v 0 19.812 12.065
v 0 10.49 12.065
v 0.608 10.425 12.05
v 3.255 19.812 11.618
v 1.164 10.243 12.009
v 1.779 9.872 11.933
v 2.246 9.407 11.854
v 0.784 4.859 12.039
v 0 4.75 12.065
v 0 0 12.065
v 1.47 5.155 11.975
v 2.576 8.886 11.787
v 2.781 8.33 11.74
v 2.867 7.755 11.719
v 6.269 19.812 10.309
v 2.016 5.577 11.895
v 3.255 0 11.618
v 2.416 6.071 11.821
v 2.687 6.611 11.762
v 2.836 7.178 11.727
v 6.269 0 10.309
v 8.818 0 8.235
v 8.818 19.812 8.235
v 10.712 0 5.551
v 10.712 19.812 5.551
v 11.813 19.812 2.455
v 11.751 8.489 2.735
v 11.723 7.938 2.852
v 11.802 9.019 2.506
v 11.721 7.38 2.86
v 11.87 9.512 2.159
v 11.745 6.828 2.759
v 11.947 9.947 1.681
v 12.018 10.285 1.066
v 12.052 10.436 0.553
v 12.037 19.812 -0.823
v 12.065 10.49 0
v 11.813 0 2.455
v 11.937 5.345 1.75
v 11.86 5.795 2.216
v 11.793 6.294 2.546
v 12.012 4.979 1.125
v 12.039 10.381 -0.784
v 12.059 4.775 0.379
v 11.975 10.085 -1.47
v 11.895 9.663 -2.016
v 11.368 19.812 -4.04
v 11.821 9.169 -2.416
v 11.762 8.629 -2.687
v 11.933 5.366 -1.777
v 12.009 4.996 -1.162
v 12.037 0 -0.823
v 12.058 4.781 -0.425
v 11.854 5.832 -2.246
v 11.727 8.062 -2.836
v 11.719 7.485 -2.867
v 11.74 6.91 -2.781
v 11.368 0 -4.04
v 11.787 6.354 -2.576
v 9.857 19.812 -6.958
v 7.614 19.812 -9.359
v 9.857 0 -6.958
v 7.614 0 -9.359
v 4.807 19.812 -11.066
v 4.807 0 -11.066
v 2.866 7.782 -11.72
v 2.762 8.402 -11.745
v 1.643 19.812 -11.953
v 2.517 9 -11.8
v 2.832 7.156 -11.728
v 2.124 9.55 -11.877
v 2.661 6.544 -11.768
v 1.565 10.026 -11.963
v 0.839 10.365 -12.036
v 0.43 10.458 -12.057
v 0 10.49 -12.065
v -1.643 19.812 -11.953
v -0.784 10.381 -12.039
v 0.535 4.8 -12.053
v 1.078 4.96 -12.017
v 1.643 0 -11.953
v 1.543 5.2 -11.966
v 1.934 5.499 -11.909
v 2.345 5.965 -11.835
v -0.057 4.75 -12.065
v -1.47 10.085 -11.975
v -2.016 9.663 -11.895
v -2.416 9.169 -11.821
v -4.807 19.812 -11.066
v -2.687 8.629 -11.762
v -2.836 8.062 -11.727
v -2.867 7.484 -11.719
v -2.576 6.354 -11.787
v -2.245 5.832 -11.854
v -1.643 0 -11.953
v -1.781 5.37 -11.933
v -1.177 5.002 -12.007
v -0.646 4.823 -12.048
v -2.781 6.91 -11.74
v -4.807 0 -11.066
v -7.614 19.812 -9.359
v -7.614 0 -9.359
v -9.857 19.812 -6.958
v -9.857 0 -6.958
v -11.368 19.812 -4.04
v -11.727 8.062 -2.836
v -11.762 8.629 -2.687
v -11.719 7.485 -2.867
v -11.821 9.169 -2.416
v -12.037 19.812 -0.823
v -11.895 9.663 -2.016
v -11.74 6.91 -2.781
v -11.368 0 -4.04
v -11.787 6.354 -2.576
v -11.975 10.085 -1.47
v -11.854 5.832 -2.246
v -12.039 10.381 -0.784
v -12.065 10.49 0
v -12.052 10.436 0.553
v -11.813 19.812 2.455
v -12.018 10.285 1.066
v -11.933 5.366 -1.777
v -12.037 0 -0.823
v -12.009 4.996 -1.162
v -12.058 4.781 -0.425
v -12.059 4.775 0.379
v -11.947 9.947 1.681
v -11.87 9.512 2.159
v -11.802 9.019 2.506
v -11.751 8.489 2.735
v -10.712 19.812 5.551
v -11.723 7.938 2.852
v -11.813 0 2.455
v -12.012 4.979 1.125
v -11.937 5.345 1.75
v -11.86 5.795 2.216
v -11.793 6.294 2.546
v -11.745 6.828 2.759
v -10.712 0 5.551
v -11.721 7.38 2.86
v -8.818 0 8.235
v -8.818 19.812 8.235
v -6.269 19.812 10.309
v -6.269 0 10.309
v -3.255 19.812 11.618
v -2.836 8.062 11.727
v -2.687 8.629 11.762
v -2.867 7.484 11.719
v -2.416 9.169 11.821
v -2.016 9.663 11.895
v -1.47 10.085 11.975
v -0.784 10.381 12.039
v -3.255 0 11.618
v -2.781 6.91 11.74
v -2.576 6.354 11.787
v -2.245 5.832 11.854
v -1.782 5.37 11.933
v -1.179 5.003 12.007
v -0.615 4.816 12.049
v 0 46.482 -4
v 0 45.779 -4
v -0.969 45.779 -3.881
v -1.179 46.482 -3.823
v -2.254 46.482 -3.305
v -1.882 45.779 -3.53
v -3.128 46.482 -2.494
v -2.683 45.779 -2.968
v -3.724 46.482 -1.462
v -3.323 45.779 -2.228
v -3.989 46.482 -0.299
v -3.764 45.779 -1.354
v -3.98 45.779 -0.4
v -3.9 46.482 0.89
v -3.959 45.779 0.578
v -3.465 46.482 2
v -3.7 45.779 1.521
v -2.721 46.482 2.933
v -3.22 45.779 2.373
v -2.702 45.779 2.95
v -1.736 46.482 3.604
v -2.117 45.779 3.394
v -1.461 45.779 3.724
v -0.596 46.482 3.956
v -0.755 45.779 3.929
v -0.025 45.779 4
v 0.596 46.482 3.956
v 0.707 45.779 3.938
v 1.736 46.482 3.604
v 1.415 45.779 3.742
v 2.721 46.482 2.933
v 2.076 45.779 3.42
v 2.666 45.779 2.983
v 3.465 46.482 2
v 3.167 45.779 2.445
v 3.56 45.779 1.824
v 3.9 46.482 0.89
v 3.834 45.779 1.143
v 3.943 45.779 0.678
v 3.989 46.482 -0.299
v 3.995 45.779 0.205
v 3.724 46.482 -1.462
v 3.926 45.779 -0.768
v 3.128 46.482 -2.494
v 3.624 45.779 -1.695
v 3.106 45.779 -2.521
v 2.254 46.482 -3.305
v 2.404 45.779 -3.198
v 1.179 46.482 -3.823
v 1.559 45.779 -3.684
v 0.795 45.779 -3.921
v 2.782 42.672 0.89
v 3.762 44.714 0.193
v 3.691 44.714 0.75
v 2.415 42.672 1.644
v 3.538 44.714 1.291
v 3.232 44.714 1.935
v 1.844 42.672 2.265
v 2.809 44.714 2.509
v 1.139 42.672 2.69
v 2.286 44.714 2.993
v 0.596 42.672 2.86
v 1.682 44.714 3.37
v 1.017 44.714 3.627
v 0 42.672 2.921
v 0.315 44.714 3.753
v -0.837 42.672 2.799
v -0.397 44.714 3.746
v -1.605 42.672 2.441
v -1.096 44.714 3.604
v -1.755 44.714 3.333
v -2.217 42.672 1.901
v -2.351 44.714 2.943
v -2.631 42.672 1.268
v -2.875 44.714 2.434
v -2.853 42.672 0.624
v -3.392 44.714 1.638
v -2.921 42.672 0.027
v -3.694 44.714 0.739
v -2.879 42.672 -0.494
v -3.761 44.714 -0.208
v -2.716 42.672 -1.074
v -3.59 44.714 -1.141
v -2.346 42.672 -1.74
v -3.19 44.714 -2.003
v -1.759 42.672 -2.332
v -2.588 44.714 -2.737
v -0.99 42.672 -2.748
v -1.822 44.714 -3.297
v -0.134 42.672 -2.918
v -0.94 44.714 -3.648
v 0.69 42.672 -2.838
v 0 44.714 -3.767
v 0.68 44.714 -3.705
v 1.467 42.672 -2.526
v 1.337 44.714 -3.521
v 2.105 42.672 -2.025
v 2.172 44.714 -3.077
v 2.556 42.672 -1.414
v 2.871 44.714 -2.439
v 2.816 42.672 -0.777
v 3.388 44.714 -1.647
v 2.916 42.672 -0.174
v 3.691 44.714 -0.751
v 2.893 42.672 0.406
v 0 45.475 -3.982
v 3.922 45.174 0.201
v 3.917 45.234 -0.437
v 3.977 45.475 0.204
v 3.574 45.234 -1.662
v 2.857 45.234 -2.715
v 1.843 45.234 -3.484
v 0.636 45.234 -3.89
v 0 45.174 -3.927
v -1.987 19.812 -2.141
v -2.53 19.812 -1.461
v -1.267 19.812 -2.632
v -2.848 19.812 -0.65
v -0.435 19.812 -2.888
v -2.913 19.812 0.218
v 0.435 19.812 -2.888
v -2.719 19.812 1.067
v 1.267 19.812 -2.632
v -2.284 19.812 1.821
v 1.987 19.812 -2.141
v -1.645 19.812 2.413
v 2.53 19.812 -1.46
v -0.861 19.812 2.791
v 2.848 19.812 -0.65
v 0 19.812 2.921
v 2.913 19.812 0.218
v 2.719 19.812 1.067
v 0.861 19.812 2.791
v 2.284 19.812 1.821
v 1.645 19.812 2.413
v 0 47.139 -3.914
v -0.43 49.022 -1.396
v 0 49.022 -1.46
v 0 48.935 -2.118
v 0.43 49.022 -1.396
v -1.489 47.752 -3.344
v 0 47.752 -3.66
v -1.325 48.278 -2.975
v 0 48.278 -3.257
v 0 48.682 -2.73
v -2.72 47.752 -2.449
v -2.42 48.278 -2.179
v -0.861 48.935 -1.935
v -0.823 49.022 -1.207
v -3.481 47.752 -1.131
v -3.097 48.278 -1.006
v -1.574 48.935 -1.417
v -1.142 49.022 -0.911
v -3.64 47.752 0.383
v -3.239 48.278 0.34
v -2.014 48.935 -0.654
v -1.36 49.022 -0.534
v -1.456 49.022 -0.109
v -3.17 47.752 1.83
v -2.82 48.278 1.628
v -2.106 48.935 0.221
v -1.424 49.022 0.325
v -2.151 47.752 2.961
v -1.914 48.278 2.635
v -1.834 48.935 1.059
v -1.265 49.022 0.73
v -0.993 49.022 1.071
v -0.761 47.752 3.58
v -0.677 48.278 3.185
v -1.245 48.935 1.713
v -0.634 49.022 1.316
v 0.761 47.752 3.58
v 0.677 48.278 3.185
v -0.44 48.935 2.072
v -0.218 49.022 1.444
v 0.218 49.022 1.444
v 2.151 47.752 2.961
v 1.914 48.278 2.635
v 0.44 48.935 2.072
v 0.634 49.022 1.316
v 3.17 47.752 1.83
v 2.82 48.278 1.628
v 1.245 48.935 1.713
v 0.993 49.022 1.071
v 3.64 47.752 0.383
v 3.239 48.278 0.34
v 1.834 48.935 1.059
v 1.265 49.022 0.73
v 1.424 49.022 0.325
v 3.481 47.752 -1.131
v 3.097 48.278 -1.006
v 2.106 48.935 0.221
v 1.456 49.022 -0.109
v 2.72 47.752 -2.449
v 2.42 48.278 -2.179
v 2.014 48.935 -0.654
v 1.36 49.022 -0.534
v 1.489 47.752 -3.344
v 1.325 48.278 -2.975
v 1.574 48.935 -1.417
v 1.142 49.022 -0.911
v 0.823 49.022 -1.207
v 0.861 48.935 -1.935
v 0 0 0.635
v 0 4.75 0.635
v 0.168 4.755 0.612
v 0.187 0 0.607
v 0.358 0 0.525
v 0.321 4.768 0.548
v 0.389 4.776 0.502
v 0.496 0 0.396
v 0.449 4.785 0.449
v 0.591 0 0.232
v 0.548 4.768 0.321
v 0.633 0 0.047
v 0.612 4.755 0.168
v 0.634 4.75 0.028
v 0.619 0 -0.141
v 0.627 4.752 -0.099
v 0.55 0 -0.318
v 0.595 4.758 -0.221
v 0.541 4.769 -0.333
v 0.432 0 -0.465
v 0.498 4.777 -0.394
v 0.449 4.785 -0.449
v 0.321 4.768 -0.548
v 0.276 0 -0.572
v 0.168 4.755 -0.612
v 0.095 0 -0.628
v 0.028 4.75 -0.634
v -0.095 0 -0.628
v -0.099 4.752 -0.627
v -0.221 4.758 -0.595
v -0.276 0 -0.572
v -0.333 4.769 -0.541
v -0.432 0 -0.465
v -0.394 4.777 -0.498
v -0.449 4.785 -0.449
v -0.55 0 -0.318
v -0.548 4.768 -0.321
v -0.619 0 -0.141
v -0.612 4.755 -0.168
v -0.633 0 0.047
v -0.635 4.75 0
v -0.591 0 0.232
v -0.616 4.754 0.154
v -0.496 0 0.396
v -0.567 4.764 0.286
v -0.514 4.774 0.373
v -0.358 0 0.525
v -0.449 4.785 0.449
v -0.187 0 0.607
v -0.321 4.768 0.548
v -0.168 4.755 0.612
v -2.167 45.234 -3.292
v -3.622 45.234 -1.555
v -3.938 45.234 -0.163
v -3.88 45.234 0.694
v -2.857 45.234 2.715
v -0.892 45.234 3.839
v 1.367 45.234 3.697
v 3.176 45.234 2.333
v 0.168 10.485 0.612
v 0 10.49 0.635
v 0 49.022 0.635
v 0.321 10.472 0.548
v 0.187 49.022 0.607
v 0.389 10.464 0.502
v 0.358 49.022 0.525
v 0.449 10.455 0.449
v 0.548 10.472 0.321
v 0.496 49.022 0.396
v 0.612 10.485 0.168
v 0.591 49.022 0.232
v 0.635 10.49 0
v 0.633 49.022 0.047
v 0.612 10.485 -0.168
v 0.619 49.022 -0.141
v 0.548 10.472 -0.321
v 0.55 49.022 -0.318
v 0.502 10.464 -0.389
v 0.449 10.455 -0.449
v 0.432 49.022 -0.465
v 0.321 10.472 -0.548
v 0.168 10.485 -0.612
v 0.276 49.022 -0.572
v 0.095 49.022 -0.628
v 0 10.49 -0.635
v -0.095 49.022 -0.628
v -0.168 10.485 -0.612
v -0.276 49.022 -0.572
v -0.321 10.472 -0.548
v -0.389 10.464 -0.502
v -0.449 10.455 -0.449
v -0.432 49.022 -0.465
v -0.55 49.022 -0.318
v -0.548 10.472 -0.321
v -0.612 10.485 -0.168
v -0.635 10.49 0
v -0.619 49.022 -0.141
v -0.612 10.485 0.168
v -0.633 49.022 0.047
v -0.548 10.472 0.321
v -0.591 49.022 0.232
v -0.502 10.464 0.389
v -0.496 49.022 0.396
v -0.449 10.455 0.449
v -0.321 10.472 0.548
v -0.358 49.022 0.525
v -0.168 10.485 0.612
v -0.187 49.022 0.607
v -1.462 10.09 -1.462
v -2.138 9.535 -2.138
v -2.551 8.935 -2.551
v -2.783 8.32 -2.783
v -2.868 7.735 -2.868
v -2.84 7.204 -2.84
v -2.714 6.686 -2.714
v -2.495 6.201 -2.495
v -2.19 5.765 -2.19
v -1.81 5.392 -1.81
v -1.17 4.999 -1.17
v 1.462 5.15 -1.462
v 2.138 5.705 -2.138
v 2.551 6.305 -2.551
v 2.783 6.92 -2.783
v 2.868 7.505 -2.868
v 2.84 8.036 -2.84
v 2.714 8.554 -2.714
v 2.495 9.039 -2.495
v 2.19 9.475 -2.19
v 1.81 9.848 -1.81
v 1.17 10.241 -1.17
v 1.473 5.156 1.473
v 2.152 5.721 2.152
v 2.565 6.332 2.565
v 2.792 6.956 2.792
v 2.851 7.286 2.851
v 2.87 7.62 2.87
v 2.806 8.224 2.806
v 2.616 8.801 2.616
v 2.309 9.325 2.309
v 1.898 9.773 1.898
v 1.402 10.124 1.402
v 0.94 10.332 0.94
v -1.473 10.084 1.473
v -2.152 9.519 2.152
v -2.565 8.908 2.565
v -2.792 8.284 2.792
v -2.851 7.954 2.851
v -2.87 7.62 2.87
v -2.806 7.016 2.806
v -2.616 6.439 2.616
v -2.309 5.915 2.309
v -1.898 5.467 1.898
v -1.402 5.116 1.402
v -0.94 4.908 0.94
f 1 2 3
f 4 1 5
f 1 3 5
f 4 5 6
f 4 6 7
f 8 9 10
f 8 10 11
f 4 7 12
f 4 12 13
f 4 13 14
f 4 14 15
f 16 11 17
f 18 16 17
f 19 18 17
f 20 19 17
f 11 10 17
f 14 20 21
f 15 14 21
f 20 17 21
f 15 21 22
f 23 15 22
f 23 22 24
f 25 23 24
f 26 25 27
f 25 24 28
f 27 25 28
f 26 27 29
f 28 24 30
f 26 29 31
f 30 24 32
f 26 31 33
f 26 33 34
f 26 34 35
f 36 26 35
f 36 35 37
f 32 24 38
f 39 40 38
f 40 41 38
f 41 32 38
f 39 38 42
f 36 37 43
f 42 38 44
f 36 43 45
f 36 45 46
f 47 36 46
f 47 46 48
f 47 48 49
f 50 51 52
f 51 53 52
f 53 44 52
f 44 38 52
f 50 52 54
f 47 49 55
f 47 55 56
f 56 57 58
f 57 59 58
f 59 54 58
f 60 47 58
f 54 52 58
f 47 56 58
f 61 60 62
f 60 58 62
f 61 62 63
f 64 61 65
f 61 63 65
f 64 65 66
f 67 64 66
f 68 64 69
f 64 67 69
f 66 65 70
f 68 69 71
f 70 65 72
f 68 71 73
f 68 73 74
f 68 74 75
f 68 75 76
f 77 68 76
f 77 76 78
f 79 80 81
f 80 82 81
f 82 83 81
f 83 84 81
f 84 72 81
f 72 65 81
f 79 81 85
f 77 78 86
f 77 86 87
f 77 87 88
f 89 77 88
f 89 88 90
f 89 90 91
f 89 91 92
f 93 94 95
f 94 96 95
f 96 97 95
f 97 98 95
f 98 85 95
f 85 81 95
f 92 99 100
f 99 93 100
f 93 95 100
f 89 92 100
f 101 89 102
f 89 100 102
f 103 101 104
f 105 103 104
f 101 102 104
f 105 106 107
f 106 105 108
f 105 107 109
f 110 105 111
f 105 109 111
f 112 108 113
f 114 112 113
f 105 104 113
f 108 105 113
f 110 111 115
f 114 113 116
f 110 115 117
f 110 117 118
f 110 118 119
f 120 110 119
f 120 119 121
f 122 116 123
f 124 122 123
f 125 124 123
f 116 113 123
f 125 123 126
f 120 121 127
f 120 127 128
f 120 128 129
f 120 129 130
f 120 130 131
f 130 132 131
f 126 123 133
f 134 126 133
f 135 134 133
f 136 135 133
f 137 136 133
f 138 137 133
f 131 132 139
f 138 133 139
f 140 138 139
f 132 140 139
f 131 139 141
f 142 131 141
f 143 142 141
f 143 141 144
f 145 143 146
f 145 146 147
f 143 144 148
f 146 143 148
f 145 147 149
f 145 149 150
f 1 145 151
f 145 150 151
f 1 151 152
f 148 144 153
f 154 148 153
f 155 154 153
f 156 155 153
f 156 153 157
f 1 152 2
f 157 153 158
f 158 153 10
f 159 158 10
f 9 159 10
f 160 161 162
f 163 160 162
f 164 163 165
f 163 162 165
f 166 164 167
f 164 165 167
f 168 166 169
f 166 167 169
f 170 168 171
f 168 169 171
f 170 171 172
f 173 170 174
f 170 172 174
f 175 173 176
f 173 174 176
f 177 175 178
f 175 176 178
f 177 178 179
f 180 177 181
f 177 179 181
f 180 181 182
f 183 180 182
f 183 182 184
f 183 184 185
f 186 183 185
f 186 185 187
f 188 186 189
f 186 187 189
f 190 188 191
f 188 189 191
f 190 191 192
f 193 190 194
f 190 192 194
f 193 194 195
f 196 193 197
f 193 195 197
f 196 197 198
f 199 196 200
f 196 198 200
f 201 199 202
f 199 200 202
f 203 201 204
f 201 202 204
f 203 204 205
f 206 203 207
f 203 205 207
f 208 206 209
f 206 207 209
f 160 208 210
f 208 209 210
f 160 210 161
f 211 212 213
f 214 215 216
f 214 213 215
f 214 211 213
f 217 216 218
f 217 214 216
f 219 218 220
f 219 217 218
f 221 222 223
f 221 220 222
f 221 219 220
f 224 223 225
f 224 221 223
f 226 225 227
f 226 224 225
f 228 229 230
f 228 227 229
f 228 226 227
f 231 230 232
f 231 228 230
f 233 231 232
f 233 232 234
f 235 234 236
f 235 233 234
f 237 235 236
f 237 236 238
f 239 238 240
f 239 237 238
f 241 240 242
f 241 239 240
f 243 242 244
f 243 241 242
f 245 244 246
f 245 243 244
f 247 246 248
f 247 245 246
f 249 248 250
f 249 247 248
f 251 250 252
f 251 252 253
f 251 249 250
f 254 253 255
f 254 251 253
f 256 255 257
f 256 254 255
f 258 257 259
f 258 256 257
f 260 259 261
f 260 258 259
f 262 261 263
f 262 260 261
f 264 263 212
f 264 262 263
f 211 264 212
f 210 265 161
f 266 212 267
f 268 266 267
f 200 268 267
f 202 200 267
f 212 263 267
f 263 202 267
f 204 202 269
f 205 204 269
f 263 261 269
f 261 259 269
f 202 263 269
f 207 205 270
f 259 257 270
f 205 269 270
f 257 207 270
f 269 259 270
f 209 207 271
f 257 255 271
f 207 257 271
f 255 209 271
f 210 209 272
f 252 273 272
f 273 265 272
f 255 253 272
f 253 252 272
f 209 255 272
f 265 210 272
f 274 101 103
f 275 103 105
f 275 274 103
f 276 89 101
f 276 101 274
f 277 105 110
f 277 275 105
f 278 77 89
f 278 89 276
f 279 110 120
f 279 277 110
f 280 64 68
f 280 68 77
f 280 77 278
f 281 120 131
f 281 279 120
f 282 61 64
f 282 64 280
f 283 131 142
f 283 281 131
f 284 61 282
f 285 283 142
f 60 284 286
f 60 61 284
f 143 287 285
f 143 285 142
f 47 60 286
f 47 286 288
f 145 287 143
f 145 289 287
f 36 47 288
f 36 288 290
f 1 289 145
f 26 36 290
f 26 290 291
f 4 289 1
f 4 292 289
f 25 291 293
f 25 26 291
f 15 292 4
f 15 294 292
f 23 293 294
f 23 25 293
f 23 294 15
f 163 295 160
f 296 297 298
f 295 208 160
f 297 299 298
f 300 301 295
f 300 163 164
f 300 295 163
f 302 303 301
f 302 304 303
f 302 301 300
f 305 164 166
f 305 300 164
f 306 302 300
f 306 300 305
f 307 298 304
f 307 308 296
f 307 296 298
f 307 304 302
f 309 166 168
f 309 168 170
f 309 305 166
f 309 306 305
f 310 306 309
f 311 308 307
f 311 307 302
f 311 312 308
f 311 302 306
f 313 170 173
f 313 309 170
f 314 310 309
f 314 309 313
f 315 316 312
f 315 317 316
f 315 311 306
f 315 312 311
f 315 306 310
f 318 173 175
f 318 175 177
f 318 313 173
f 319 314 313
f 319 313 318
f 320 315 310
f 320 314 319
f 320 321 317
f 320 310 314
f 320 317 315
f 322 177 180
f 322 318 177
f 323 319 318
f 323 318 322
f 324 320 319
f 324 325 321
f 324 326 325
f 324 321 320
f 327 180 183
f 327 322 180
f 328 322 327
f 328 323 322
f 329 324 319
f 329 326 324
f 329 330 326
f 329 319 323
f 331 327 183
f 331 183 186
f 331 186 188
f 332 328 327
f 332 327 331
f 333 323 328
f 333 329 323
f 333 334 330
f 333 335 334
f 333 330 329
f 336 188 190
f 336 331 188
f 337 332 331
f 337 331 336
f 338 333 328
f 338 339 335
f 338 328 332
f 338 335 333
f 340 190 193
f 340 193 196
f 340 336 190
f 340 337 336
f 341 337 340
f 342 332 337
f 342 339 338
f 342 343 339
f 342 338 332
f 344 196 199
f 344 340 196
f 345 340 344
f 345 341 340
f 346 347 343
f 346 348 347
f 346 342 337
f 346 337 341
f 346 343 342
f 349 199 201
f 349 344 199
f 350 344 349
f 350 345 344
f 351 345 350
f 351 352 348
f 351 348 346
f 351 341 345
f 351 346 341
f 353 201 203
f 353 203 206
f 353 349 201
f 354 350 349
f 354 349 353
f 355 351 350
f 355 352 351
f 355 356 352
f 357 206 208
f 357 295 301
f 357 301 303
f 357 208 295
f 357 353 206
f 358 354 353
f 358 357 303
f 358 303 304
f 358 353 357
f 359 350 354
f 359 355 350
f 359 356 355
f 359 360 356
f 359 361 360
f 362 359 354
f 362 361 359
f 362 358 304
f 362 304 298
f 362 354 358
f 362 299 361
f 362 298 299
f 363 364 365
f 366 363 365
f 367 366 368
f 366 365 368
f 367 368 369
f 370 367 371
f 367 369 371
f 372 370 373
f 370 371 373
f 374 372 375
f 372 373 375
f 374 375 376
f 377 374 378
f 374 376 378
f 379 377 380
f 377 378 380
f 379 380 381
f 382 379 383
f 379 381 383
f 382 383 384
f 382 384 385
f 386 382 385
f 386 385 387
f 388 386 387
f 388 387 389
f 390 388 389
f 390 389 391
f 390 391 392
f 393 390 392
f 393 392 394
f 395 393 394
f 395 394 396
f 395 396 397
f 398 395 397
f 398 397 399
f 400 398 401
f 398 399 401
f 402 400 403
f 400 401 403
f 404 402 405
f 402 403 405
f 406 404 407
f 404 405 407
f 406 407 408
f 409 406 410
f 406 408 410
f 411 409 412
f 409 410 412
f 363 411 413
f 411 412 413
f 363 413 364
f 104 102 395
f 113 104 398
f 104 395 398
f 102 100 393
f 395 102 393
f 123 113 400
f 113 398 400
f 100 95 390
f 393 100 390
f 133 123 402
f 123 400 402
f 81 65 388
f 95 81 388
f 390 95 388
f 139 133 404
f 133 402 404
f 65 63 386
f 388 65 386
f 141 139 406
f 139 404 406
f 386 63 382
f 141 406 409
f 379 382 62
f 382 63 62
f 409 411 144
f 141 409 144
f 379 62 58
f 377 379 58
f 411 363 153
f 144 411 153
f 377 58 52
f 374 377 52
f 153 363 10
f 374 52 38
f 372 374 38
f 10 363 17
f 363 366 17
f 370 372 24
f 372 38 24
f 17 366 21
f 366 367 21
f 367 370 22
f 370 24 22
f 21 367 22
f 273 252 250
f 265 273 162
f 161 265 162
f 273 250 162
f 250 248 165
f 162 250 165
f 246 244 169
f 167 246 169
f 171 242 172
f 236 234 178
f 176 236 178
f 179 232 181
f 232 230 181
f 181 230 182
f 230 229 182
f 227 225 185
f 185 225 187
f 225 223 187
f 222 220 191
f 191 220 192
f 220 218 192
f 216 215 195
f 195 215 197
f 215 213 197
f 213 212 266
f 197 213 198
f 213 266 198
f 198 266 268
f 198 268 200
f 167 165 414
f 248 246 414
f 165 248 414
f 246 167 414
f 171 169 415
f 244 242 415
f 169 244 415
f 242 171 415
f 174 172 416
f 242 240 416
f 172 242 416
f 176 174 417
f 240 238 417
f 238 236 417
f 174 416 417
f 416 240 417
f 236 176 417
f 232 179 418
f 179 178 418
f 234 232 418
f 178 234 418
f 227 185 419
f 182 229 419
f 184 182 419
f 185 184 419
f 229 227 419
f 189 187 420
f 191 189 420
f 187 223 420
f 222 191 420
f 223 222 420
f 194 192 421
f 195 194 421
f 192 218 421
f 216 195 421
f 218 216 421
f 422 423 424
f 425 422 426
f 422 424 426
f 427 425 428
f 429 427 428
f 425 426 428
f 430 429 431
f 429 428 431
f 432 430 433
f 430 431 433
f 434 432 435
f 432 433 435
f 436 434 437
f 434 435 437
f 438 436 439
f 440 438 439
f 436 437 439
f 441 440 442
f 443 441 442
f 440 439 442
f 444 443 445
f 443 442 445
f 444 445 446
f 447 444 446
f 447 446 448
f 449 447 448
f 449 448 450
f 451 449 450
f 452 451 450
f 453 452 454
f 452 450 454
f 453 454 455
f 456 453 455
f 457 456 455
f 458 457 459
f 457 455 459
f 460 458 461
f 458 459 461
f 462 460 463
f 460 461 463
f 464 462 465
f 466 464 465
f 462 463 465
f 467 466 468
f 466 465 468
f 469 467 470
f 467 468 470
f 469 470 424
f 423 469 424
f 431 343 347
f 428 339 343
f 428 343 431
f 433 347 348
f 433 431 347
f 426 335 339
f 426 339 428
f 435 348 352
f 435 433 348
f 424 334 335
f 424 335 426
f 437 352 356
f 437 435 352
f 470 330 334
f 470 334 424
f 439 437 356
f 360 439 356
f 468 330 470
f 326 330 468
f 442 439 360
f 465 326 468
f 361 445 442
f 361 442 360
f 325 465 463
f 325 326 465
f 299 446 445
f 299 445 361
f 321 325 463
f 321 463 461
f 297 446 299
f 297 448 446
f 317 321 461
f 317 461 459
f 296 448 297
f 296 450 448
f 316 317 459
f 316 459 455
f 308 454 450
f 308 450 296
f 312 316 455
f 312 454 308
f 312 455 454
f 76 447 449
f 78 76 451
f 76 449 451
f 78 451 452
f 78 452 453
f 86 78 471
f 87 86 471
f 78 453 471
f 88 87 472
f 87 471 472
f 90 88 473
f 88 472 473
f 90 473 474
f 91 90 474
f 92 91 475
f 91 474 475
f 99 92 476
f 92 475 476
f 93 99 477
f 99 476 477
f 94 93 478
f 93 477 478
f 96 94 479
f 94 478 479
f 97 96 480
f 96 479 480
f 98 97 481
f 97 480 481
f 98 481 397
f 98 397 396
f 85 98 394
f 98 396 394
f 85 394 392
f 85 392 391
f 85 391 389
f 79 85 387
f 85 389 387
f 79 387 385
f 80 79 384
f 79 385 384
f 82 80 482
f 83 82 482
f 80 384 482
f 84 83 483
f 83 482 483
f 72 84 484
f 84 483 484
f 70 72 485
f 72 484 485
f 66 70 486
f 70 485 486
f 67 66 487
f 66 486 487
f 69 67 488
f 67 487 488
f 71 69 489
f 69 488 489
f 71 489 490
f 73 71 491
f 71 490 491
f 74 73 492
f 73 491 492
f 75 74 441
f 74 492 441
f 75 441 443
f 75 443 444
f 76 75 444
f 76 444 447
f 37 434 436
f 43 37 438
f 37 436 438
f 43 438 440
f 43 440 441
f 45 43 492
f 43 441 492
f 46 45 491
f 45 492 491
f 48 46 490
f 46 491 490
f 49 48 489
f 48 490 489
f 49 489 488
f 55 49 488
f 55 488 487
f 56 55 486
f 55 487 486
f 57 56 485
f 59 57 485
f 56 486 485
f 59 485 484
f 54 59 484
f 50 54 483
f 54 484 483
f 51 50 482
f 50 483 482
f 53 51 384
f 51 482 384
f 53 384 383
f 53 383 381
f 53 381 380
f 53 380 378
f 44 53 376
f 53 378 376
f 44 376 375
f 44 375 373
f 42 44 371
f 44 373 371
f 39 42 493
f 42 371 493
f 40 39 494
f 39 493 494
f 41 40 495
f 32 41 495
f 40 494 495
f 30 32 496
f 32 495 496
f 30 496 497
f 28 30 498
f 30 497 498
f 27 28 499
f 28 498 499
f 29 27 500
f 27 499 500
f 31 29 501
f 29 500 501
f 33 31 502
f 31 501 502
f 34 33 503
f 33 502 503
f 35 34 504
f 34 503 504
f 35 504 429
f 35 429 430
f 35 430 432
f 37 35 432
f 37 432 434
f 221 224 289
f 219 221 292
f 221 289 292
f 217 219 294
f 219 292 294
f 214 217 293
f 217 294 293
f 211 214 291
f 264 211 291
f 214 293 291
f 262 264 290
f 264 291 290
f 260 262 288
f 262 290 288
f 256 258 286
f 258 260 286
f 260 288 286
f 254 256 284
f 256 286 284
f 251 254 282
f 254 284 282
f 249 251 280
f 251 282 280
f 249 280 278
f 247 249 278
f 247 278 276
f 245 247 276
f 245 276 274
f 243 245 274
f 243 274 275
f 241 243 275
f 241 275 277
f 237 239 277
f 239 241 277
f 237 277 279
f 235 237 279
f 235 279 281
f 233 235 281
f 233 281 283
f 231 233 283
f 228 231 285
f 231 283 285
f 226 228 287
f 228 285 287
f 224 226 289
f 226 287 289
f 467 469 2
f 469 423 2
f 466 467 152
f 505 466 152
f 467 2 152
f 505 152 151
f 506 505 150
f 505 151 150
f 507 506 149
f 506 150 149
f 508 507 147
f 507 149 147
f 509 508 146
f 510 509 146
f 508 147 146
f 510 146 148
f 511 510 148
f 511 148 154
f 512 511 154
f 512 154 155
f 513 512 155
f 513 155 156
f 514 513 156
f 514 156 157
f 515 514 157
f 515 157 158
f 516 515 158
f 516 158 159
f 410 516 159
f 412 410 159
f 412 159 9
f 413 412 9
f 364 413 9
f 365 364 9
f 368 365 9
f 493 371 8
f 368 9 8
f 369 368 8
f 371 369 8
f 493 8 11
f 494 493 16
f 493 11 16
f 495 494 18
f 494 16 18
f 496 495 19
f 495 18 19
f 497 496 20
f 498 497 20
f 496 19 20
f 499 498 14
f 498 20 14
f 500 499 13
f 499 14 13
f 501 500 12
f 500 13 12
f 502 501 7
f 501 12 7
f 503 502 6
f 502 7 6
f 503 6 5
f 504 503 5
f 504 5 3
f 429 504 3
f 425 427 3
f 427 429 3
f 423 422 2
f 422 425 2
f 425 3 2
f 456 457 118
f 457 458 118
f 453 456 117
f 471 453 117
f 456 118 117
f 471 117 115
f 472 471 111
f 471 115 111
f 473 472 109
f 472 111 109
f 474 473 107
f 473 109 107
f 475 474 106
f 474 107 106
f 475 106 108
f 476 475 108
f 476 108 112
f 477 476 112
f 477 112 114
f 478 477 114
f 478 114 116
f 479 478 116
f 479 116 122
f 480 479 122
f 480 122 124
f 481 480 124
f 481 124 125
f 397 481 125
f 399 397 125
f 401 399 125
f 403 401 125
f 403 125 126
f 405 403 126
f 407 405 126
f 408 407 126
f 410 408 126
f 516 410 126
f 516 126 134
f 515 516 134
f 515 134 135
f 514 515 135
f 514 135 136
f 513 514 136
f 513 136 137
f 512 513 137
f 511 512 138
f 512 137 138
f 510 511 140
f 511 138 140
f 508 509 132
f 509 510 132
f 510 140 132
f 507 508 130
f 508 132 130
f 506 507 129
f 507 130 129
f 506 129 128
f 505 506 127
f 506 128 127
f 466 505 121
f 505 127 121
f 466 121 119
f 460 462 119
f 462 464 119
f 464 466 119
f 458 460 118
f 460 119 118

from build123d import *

# Parameters (mm, degrees)
SKETCH1_R           = 12.065
BOSS_EXTRUDE1_DEPTH = 19.812
SKETCH2_R           = 2.921
BOSS_EXTRUDE2_DEPTH = 25.4
SKETCH3_R           = 4.0005
BOSS_EXTRUDE3_DEPTH = 3.81
FILLET3_R           = 2.54
SKETCH7_R           = 2.8702
CUT_EXTRUDE1_DEPTH  = 12.7
CIRPATTERN1_COUNT   = 2
CIRPATTERN1_ANGLE   = 90
FILLET4_R           = 2.54
CUT_EXTRUDE2_REACH  = 53.907
SKETCH9_R           = 0.635


with BuildPart() as part:
    # Sketch1 → Boss-Extrude1 (new body)
    with BuildSketch(Plane(origin=(0, 0, 0), x_dir=(1, 0, 0), z_dir=(0, 1, 0))):
        with Locations(Location((0, 0, 0), (0, 0, 270))):
            Circle(SKETCH1_R)
    extrude(amount=BOSS_EXTRUDE1_DEPTH)

    # Sketch2 → Boss-Extrude2 (add)
    with BuildSketch(Plane(origin=(0, 19.812, 0), x_dir=(1, 0, 0), z_dir=(0, 1, 0))):
        with Locations(Location((0, 0, 0), (0, 0, 270))):
            Circle(SKETCH2_R)
    extrude(amount=BOSS_EXTRUDE2_DEPTH)

    # Sketch3 → Boss-Extrude3 (add)
    with BuildSketch(Plane(origin=(0, 45.212, 0), x_dir=(1, 0, 0), z_dir=(0, 1, 0))):
        with Locations(Location((0, 0, 0), (0, 0, 90))):
            Circle(SKETCH3_R)
    extrude(amount=BOSS_EXTRUDE3_DEPTH)

    # Fillet3
    fillet3_edges = [part.edges().sort_by_distance(p)[0] for p in [
        (0, 49.022, 4.0005),
    ]]
    fillet(fillet3_edges, radius=FILLET3_R)

    # Sketch7 → Cut-Extrude1 (cut, symmetric)
    with BuildSketch(Plane.XY):
        with Locations(Location((0, 7.62, 0), (0, 0, 90.000000025))):
            Circle(SKETCH7_R)
    cut_extrude1 = extrude(amount=CUT_EXTRUDE1_DEPTH, both=True, mode=Mode.SUBTRACT)

    # CirPattern1: Cut-Extrude1 ×2 about axis
    cirpattern1_axis = Axis((0, 45.212, 0), (0, -1, 0))
    for i in range(1, CIRPATTERN1_COUNT):
        add(cut_extrude1.rotate(cirpattern1_axis, i * CIRPATTERN1_ANGLE / (CIRPATTERN1_COUNT - 1)), mode=Mode.SUBTRACT)

    # Loft1: read off the stored shape, not the designer's step
    # Loft1: loft between two sections, ruled curve by curve
    loft1_from = [
        Edge.make_bspline([(4.000436037, 45.212, 0.022622174), (3.955191689, 45.212, 8.023494248), (-4.045680385, 45.212, 7.9782499), (-4.000436037, 45.212, -0.022622174), (-3.955191689, 45.212, -8.023494248), (4.045680385, 45.212, -7.9782499), (4.000436037, 45.212, 0.022622174)], [0, 0, 0, 0, 0.5, 0.5, 0.5, 1, 1, 1, 1], 3, [1, 0.333333333, 0.333333333, 1, 0.333333333, 0.333333333, 1]),
    ]
    loft1_to = [
        Edge.make_bspline([(2.781979214, 42.672, 0.890411509), (1.001156196, 42.672, 6.454369936), (-4.562802231, 42.672, 4.673546919), (-2.781979214, 42.672, -0.890411509), (-1.001156196, 42.672, -6.454369936), (4.562802231, 42.672, -4.673546919), (2.781979214, 42.672, 0.890411509)], [0, 0, 0, 0, 0.5, 0.5, 0.5, 1, 1, 1, 1], 3, [1, 0.333333333, 0.333333333, 1, 0.333333333, 0.333333333, 1]),
    ]
    loft1 = Solid(Shell([*[Face.make_surface_from_curves(loft1_from[k], loft1_to[k]) for k in range(1)], Face(Wire(loft1_from)), Face(Wire(loft1_to))]))
    add(loft1)

    # Fillet4
    fillet4_edges = [part.edges().sort_by_distance(p)[0] for p in [
        (-2.836767549, 45.212, 2.820771193),
    ]]
    fillet(fillet4_edges, radius=FILLET4_R)

    # Cut-Extrude2: up to this face of the body (flat: up to its plane)
    cut_extrude2_end = Plane(part.part.faces().sort_by_distance((0, 0, 0))[0])
    # Sketch9 → Cut-Extrude2 (cut, up to the picked face)
    with BuildSketch(Plane(origin=(0, 49.022, 0), x_dir=(1, 0, 0), z_dir=(0, 1, 0)), mode=Mode.PRIVATE) as cut_extrude2_sk1:
        with Locations(Location((0, 0, 0), (0, 0, 270))):
            Circle(SKETCH9_R)
    cut_extrude2_tool1 = split(extrude(cut_extrude2_sk1.sketch, amount=-CUT_EXTRUDE2_REACH, mode=Mode.PRIVATE), bisect_by=cut_extrude2_end, keep=Keep.BOTH, mode=Mode.PRIVATE)
    add(cut_extrude2_tool1.solids().sort_by(Axis((0, 49.022, 0), (0, -1, 0)))[0], mode=Mode.SUBTRACT)


solid = part.part
